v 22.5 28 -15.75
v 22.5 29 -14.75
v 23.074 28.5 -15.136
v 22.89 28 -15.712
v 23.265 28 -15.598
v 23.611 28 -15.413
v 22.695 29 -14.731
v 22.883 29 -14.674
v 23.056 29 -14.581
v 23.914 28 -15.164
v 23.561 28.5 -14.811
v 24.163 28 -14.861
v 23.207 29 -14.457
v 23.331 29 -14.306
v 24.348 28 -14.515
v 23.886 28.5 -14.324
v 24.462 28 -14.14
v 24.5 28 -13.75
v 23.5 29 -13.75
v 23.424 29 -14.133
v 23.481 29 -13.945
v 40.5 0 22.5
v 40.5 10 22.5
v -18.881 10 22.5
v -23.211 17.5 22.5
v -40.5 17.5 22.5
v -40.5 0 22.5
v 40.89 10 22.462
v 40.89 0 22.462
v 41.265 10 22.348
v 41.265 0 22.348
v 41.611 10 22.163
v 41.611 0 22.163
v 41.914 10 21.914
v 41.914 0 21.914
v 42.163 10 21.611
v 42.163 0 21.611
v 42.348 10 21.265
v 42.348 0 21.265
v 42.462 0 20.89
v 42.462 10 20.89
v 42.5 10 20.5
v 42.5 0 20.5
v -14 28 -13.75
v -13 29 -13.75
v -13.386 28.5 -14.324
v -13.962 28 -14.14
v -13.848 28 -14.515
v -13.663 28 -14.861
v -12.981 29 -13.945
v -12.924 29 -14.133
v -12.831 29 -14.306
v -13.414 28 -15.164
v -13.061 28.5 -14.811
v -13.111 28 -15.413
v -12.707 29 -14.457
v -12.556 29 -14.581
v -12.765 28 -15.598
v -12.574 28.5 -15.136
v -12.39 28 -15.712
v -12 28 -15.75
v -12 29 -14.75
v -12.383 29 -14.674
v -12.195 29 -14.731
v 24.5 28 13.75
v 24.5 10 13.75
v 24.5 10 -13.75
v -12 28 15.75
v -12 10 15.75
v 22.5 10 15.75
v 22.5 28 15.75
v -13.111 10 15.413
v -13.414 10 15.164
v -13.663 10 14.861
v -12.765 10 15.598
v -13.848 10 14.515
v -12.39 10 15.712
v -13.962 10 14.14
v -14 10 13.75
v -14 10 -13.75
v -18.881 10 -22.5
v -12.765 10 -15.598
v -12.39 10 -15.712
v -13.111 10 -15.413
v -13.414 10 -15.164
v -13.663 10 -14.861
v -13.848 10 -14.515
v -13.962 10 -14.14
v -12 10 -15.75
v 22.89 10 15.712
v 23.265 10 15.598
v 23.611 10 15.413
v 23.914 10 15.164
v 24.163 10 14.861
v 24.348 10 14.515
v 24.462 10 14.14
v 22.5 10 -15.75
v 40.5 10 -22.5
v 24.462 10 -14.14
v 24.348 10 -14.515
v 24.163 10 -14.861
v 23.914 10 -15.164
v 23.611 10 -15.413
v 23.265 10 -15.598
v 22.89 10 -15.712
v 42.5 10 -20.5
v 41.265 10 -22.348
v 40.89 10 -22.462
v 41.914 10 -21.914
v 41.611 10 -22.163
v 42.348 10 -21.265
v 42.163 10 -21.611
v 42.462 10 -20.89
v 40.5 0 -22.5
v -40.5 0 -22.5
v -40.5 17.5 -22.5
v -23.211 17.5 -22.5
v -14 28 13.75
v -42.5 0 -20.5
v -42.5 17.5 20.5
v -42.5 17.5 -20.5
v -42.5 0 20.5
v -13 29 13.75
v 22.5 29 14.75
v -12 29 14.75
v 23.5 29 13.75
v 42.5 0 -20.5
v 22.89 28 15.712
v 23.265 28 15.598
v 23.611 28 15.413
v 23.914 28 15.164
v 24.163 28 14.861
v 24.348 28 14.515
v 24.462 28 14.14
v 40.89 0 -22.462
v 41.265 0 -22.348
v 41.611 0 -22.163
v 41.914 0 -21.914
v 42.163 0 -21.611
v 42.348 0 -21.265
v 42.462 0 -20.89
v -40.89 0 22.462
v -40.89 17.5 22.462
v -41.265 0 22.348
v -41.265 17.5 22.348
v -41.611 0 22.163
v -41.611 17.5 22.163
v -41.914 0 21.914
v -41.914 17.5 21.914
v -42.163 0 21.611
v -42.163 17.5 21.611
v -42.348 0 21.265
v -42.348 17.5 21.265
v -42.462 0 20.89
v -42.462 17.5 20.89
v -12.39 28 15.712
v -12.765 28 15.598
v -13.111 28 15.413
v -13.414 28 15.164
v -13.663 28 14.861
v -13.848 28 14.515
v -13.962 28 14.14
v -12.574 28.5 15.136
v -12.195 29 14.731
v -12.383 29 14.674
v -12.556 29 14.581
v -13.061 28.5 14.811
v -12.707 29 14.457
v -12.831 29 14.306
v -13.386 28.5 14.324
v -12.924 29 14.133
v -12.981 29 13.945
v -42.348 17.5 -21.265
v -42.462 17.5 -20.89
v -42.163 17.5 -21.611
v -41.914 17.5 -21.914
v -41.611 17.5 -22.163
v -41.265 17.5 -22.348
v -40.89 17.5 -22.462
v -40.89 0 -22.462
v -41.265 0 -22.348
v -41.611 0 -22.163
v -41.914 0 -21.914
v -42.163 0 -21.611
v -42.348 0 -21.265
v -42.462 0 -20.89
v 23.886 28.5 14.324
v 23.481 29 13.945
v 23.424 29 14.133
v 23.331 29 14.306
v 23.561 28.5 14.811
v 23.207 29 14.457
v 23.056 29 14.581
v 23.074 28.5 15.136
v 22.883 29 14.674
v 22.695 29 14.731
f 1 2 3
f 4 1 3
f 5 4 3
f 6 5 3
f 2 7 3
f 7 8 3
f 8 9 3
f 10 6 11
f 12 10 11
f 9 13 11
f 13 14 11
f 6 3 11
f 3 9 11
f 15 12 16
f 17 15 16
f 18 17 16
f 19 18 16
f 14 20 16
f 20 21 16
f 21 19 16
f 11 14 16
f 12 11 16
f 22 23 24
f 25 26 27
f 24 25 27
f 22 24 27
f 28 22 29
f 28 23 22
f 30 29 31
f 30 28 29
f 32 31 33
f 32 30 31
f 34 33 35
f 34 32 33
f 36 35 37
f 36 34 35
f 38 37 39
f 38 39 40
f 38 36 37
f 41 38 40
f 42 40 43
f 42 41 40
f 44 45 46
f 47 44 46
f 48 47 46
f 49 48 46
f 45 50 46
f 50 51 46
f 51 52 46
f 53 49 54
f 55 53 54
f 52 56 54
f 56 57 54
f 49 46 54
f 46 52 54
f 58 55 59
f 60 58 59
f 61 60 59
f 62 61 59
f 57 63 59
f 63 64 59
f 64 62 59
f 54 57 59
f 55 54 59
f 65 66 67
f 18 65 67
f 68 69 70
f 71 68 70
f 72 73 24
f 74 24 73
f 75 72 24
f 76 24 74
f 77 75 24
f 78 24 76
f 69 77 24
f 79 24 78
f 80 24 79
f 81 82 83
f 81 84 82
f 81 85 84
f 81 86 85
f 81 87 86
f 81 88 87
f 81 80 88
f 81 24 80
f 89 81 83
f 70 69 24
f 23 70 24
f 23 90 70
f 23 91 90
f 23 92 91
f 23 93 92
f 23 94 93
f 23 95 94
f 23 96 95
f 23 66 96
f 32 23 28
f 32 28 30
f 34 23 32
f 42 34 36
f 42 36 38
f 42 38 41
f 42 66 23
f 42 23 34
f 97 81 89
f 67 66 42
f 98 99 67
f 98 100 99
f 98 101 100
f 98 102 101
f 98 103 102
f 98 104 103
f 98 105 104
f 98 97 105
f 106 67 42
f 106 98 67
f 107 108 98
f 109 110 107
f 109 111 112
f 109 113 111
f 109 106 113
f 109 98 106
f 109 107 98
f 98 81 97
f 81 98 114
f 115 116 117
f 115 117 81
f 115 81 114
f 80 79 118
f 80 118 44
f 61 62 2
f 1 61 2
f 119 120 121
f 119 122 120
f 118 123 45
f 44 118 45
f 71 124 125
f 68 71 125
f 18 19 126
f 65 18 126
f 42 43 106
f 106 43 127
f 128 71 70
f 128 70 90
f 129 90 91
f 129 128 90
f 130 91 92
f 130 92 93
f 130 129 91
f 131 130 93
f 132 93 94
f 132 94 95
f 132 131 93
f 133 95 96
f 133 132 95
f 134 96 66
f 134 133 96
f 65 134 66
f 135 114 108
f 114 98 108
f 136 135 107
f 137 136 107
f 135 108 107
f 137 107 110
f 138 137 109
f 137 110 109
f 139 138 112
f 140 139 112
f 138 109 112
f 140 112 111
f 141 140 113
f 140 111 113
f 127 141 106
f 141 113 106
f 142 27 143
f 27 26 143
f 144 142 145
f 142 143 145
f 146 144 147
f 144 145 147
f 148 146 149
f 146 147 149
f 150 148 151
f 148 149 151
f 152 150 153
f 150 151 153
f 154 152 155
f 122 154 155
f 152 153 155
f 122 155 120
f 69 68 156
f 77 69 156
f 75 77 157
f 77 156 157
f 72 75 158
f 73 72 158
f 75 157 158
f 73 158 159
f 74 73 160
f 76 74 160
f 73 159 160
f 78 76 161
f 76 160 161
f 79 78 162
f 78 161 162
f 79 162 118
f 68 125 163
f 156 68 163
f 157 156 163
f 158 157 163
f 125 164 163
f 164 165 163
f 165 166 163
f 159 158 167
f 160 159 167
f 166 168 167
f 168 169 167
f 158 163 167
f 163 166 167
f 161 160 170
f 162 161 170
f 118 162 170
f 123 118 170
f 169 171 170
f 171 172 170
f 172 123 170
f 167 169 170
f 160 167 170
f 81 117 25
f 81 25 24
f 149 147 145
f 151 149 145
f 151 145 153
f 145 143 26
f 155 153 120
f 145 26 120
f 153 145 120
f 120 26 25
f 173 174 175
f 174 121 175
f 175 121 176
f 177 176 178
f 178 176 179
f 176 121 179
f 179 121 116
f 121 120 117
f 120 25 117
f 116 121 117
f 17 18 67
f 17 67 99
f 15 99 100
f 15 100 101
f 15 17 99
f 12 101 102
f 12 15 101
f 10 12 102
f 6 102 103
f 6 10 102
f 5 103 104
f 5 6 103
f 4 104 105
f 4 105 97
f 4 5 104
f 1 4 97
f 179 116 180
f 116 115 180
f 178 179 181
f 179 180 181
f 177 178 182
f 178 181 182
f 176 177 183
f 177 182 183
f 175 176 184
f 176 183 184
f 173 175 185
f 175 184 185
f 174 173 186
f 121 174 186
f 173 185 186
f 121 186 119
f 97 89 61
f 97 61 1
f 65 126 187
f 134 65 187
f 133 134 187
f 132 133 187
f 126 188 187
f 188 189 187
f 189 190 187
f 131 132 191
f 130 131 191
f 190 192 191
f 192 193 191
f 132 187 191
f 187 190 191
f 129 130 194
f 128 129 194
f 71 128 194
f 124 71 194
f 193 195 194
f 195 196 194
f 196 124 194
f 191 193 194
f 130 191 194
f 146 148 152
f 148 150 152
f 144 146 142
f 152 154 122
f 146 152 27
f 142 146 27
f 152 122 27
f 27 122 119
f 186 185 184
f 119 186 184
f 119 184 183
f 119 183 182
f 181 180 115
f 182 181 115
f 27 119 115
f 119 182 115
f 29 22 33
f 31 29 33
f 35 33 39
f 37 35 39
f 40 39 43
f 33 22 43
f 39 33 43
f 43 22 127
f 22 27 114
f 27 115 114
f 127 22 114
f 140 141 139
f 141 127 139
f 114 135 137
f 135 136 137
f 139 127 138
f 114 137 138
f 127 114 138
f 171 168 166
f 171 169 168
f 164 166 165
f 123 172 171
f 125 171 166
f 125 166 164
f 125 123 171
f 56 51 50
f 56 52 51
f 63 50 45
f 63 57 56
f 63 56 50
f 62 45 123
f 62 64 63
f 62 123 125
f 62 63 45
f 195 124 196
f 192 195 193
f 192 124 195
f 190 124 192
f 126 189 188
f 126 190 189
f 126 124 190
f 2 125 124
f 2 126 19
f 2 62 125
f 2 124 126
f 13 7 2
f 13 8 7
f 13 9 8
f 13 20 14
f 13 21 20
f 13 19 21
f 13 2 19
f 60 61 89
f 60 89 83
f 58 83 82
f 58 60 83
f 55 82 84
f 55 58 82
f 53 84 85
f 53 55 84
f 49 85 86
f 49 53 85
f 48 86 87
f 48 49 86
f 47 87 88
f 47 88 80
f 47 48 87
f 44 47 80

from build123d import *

# Parameters (mm, degrees)
SKETCH_1_W       = 85
SKETCH_1_H       = 45
EXTRUDE_1_DEPTH  = 10
SKETCH_2_W       = 19
SKETCH_2_H       = 45
EXTRUDE_2_DEPTH  = 7.5
CHAMFER_1_SIZE   = 8
CHAMFER_1_SIZE_2 = 4.618802154
SKETCH_3_W       = 38.5
SKETCH_3_H       = 31.5
EXTRUDE_3_DEPTH  = 19
FILLET_1_R       = 2
CHAMFER_2_SIZE   = 1
FILLET_2_R       = 2


with BuildPart() as part:
    # 草图1 → 凸台-拉伸1 (new body)
    with BuildSketch(Plane(origin=(0, 0, 0), x_dir=(1, 0, 0), z_dir=(0, 1, 0))):
        Rectangle(SKETCH_1_W, SKETCH_1_H)
    extrude(amount=EXTRUDE_1_DEPTH)

    # 草图2 → 凸台-拉伸2 (add)
    with BuildSketch(Plane(origin=(0, 10, 0), x_dir=(1, 0, 0), z_dir=(0, 1, 0))):
        with Locations((-33, 0)):
            Rectangle(SKETCH_2_W, SKETCH_2_H)
    extrude(amount=EXTRUDE_2_DEPTH)

    # 倒角1
    # the kernel refuses this chamfer: 8, 4.618802154 mm, written as the material it adds along each edge
    with BuildSketch(Plane(origin=(-23.5, 10, -22.5), x_dir=(-0.01932676561270072, 0.9998132206222079, 0), z_dir=(0, 0, 1))) as chamfer_1_piece_1_section:
        Polygon((CHAMFER_1_SIZE * 0.999813220622, -CHAMFER_1_SIZE * 0.0193267656127), (-CHAMFER_1_SIZE_2 * 0.0193267656107, -CHAMFER_1_SIZE_2 * 0.999813220518), (0, 0), align=None)
    chamfer_1_piece_1 = extrude(amount=45, mode=Mode.PRIVATE)
    chamfer_1_piece_1 = split(chamfer_1_piece_1, bisect_by=Plane(origin=(-21.997429692, 17.5, 0), z_dir=(0, -1, 0)), keep=Keep.TOP, mode=Mode.PRIVATE)
    add(chamfer_1_piece_1)

    # 草图3 → 凸台-拉伸3 (add)
    with BuildSketch(Plane(origin=(0, 10, 0), x_dir=(1, 0, 0), z_dir=(0, 1, 0))):
        with Locations((5.25, 0)):
            Rectangle(SKETCH_3_W, SKETCH_3_H)
    extrude(amount=EXTRUDE_3_DEPTH)

    # 圆角1
    fillet_1_edges = [part.edges().sort_by_distance(p)[0] for p in [
        (-14, 19.5, -15.75),
        (-14, 19.5, 15.75),
        (24.5, 19.5, 15.75),
        (24.5, 19.5, -15.75),
    ]]
    fillet(fillet_1_edges, radius=FILLET_1_R)

    # 倒角2
    chamfer_2_edges = [part.edges().sort_by_distance(p)[0] for p in [
        (-14, 29, 0),
        (5.25, 29, -15.75),
        (5.25, 29, 15.75),
        (24.5, 29, 0),
        (-13.414213562, 29, 15.164213562),
        (23.914213562, 29, 15.164213562),
        (23.914213562, 29, -15.164213562),
        (-13.414213562, 29, -15.164213562),
    ]]
    chamfer(chamfer_2_edges, length=CHAMFER_2_SIZE)

    # 圆角2
    fillet_2_edges = [part.edges().sort_by_distance(p)[0] for p in [
        (-42.5, 8.75, -22.5),
        (42.5, 5, -22.5),
        (42.5, 5, 22.5),
        (-42.5, 8.75, 22.5),
    ]]
    fillet(fillet_2_edges, radius=FILLET_2_R)


solid = part.part
